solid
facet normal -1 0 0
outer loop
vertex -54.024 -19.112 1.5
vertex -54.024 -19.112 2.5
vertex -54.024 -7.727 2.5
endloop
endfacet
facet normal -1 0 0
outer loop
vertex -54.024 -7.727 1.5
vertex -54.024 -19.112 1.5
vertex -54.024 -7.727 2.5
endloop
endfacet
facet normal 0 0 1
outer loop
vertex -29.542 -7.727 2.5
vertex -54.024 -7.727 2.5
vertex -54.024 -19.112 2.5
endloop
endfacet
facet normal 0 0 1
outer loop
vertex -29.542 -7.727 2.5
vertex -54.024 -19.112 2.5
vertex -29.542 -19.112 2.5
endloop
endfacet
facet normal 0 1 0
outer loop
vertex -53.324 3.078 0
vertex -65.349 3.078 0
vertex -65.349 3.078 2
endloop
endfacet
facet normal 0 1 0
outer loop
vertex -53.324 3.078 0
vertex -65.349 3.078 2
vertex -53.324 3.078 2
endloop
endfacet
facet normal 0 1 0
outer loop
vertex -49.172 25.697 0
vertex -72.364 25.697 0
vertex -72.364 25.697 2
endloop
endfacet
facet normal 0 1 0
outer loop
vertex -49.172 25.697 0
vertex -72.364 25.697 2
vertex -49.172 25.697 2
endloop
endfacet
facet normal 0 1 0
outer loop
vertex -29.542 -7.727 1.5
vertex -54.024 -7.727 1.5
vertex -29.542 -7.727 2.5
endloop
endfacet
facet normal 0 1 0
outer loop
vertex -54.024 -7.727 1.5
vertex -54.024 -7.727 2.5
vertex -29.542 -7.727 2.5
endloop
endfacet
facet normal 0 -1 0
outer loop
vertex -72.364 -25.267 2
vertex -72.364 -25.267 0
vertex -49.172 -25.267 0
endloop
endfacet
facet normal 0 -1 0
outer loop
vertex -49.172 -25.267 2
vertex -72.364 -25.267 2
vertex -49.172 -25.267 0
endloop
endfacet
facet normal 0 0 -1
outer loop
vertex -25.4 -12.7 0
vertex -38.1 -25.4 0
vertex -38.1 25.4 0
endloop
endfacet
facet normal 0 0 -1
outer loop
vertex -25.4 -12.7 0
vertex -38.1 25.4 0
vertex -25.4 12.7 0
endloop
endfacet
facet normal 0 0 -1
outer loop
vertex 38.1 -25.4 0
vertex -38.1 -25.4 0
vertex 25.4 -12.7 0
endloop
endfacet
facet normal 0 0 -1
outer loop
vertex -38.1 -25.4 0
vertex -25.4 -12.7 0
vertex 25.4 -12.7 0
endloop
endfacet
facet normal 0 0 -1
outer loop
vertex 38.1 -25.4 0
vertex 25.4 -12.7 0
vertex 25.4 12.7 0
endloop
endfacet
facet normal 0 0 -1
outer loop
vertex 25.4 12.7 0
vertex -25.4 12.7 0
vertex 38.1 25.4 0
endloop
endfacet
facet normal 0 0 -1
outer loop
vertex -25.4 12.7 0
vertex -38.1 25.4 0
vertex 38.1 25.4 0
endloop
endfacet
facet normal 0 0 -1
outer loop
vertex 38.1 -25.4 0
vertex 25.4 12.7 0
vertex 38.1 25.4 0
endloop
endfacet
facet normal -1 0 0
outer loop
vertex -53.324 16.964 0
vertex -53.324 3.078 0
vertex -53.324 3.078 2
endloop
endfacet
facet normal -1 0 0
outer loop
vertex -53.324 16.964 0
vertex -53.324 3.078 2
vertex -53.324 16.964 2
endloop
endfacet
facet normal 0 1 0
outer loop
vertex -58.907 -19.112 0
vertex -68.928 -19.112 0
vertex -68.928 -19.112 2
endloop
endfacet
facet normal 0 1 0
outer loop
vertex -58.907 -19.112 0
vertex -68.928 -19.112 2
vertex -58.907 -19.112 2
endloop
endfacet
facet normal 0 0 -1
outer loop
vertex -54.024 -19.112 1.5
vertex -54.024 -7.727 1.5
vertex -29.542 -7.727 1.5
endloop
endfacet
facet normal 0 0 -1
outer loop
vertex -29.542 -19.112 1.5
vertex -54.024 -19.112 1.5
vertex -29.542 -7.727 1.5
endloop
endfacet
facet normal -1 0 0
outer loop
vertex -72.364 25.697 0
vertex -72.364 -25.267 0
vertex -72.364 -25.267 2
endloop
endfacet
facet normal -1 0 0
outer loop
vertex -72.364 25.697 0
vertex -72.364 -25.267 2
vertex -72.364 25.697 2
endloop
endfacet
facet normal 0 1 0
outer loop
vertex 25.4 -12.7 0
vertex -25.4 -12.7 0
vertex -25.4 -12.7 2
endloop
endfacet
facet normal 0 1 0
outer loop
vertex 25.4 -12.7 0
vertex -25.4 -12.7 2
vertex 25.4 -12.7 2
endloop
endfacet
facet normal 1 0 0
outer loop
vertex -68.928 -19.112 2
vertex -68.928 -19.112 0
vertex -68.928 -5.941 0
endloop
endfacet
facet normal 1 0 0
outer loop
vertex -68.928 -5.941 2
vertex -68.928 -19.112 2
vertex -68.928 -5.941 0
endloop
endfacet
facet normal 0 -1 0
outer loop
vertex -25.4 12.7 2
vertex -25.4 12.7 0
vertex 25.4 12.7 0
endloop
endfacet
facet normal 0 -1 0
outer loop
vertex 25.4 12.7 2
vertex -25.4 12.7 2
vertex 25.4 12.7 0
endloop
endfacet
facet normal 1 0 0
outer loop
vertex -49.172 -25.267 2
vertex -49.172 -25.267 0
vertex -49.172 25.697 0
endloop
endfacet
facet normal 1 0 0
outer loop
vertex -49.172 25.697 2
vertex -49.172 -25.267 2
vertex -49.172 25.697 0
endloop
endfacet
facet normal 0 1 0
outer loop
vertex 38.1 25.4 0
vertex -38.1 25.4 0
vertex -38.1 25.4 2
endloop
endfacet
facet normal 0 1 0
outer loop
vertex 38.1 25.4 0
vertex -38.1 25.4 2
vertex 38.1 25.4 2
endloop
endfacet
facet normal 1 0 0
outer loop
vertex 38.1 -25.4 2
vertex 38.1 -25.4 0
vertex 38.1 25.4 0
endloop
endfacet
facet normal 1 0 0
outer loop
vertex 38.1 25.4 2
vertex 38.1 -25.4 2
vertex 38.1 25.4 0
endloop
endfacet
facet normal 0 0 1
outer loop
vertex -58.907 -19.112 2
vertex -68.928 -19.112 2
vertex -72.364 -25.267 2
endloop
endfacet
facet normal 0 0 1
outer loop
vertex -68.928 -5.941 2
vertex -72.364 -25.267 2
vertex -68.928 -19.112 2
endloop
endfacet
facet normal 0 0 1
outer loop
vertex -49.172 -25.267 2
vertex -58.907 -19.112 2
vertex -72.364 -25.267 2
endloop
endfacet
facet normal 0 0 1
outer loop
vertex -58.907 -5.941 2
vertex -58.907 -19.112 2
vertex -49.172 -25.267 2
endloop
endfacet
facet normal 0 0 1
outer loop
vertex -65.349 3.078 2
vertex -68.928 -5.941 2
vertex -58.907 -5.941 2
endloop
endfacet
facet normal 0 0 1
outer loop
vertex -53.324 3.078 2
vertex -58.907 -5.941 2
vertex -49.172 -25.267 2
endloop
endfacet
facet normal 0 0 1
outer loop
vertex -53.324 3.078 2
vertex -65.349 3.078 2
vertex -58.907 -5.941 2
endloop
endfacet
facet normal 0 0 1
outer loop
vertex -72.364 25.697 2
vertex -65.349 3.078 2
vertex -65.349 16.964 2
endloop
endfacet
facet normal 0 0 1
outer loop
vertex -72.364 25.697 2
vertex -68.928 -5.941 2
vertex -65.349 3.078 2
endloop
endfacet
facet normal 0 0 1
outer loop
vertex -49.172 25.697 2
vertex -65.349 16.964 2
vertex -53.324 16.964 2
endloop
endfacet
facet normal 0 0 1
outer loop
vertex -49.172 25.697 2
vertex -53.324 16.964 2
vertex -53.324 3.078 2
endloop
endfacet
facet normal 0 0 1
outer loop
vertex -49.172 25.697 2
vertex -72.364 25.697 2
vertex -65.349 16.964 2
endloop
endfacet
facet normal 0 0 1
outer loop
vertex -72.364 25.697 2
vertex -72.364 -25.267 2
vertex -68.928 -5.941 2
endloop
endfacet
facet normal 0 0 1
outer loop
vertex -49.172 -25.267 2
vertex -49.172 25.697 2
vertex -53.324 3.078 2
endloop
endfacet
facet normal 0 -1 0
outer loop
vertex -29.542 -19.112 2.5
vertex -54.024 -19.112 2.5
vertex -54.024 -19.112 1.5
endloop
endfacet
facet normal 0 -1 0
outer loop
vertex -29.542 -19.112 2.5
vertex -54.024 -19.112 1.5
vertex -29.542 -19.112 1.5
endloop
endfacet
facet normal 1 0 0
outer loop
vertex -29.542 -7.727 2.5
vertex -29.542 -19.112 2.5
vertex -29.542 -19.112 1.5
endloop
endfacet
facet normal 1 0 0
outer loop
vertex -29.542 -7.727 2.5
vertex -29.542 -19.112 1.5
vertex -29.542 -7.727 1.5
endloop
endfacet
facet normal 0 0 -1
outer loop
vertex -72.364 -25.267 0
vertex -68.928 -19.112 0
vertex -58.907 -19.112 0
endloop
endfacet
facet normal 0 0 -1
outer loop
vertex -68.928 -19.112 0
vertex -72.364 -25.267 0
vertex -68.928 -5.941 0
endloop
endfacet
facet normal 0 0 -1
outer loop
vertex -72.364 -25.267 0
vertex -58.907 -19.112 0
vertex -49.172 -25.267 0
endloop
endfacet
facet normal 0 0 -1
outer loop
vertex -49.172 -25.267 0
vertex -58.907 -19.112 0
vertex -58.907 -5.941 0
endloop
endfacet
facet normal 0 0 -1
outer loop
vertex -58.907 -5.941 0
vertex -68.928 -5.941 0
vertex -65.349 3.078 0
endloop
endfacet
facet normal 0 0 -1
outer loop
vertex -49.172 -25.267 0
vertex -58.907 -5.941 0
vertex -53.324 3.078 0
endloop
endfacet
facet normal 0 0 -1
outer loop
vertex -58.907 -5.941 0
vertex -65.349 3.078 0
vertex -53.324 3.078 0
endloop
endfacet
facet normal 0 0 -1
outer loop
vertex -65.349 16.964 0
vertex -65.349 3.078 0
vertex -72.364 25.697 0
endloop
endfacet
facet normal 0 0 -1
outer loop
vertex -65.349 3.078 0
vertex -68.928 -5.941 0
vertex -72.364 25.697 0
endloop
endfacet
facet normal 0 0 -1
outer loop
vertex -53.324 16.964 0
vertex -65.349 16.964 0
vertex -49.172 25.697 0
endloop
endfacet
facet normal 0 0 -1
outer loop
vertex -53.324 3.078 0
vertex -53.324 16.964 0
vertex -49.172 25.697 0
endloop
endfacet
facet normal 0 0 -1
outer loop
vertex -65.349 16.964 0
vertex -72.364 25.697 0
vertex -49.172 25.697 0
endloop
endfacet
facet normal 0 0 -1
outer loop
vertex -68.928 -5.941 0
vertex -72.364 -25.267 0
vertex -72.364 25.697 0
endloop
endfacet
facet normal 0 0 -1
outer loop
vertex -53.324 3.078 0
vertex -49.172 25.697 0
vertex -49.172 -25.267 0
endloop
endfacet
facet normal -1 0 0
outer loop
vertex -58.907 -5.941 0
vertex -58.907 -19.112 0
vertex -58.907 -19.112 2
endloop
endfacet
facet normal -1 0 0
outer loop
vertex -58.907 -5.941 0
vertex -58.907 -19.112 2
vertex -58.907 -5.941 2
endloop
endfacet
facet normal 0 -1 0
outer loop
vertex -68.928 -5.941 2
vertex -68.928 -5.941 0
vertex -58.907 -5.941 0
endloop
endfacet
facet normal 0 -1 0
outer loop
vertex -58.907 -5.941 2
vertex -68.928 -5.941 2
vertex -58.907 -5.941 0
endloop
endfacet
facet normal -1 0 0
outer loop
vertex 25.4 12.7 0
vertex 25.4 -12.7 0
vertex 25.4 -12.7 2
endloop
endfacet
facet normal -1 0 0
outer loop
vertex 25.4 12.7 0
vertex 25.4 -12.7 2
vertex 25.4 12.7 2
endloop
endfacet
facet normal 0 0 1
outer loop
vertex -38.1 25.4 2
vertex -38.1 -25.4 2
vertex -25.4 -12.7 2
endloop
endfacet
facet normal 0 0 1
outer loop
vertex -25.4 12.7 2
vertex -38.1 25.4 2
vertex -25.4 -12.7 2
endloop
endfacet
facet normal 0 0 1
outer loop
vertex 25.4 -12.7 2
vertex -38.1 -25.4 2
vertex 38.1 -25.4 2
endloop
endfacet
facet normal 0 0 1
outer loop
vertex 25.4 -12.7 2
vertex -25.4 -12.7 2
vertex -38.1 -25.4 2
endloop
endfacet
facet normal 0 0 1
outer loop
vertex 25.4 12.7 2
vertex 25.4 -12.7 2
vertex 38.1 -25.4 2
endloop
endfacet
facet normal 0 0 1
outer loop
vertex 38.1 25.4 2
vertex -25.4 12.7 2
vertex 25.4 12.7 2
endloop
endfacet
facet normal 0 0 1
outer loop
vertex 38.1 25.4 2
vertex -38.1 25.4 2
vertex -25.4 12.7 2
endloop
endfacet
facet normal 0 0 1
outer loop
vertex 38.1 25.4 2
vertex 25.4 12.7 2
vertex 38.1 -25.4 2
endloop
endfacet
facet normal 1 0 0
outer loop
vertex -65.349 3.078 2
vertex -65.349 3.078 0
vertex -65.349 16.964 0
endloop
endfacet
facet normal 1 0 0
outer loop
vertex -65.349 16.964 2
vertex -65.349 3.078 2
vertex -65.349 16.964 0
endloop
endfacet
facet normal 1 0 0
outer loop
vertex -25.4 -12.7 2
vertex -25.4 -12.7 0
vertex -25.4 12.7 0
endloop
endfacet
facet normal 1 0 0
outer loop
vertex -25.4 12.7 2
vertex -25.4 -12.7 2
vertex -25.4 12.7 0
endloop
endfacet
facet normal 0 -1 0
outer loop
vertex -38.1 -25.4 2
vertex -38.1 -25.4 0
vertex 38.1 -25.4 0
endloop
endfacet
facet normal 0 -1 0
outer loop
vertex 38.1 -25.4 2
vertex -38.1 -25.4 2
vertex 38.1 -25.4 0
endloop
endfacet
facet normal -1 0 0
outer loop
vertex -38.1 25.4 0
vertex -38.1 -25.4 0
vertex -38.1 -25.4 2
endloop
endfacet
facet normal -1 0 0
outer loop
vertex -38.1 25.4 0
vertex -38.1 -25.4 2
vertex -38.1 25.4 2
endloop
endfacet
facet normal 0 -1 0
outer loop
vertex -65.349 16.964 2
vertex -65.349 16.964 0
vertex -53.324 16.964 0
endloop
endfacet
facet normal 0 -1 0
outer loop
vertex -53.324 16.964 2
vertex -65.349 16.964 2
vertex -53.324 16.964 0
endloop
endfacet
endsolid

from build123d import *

# Parameters (mm, degrees)
F0_W     = 76.2
F0_H     = 50.8
F0_W_2   = 50.8
F0_H_2   = 25.4
F0_W_3   = 23.191605
F0_H_3   = 50.96427
F0_W_4   = 10.021061
F0_H_4   = 13.170541
F0_W_5   = 12.025278
F0_H_5   = 13.886331
F1_DEPTH = 2
F2_W     = 24.481693
F2_H     = 11.384138
F3_DEPTH = 0.5


with BuildPart() as f1:
    # F0 (on Top) → F1 (new body)
    with BuildSketch(Plane.XY):
        Rectangle(F0_W, F0_H)
        Rectangle(F0_W_2, F0_H_2, mode=Mode.SUBTRACT)
        with Locations((-60.76817, 0.214737)):
            Rectangle(F0_W_3, F0_H_3)
        with Locations((-63.917644, -12.526329)):
            Rectangle(F0_W_4, F0_H_4, mode=Mode.SUBTRACT)
        with Locations((-59.33659, 10.021064)):
            Rectangle(F0_W_5, F0_H_5, mode=Mode.SUBTRACT)
    extrude(amount=F1_DEPTH)


with BuildPart() as f3:
    # F2 (on face) → F3 (new body, symmetric)
    with BuildSketch(Plane.XY.offset(2)):
        with Locations((-41.783, -13.419531)):
            Rectangle(F2_W, F2_H)
    extrude(amount=F3_DEPTH, both=True)


solid = Compound([f1.part, f3.part])
